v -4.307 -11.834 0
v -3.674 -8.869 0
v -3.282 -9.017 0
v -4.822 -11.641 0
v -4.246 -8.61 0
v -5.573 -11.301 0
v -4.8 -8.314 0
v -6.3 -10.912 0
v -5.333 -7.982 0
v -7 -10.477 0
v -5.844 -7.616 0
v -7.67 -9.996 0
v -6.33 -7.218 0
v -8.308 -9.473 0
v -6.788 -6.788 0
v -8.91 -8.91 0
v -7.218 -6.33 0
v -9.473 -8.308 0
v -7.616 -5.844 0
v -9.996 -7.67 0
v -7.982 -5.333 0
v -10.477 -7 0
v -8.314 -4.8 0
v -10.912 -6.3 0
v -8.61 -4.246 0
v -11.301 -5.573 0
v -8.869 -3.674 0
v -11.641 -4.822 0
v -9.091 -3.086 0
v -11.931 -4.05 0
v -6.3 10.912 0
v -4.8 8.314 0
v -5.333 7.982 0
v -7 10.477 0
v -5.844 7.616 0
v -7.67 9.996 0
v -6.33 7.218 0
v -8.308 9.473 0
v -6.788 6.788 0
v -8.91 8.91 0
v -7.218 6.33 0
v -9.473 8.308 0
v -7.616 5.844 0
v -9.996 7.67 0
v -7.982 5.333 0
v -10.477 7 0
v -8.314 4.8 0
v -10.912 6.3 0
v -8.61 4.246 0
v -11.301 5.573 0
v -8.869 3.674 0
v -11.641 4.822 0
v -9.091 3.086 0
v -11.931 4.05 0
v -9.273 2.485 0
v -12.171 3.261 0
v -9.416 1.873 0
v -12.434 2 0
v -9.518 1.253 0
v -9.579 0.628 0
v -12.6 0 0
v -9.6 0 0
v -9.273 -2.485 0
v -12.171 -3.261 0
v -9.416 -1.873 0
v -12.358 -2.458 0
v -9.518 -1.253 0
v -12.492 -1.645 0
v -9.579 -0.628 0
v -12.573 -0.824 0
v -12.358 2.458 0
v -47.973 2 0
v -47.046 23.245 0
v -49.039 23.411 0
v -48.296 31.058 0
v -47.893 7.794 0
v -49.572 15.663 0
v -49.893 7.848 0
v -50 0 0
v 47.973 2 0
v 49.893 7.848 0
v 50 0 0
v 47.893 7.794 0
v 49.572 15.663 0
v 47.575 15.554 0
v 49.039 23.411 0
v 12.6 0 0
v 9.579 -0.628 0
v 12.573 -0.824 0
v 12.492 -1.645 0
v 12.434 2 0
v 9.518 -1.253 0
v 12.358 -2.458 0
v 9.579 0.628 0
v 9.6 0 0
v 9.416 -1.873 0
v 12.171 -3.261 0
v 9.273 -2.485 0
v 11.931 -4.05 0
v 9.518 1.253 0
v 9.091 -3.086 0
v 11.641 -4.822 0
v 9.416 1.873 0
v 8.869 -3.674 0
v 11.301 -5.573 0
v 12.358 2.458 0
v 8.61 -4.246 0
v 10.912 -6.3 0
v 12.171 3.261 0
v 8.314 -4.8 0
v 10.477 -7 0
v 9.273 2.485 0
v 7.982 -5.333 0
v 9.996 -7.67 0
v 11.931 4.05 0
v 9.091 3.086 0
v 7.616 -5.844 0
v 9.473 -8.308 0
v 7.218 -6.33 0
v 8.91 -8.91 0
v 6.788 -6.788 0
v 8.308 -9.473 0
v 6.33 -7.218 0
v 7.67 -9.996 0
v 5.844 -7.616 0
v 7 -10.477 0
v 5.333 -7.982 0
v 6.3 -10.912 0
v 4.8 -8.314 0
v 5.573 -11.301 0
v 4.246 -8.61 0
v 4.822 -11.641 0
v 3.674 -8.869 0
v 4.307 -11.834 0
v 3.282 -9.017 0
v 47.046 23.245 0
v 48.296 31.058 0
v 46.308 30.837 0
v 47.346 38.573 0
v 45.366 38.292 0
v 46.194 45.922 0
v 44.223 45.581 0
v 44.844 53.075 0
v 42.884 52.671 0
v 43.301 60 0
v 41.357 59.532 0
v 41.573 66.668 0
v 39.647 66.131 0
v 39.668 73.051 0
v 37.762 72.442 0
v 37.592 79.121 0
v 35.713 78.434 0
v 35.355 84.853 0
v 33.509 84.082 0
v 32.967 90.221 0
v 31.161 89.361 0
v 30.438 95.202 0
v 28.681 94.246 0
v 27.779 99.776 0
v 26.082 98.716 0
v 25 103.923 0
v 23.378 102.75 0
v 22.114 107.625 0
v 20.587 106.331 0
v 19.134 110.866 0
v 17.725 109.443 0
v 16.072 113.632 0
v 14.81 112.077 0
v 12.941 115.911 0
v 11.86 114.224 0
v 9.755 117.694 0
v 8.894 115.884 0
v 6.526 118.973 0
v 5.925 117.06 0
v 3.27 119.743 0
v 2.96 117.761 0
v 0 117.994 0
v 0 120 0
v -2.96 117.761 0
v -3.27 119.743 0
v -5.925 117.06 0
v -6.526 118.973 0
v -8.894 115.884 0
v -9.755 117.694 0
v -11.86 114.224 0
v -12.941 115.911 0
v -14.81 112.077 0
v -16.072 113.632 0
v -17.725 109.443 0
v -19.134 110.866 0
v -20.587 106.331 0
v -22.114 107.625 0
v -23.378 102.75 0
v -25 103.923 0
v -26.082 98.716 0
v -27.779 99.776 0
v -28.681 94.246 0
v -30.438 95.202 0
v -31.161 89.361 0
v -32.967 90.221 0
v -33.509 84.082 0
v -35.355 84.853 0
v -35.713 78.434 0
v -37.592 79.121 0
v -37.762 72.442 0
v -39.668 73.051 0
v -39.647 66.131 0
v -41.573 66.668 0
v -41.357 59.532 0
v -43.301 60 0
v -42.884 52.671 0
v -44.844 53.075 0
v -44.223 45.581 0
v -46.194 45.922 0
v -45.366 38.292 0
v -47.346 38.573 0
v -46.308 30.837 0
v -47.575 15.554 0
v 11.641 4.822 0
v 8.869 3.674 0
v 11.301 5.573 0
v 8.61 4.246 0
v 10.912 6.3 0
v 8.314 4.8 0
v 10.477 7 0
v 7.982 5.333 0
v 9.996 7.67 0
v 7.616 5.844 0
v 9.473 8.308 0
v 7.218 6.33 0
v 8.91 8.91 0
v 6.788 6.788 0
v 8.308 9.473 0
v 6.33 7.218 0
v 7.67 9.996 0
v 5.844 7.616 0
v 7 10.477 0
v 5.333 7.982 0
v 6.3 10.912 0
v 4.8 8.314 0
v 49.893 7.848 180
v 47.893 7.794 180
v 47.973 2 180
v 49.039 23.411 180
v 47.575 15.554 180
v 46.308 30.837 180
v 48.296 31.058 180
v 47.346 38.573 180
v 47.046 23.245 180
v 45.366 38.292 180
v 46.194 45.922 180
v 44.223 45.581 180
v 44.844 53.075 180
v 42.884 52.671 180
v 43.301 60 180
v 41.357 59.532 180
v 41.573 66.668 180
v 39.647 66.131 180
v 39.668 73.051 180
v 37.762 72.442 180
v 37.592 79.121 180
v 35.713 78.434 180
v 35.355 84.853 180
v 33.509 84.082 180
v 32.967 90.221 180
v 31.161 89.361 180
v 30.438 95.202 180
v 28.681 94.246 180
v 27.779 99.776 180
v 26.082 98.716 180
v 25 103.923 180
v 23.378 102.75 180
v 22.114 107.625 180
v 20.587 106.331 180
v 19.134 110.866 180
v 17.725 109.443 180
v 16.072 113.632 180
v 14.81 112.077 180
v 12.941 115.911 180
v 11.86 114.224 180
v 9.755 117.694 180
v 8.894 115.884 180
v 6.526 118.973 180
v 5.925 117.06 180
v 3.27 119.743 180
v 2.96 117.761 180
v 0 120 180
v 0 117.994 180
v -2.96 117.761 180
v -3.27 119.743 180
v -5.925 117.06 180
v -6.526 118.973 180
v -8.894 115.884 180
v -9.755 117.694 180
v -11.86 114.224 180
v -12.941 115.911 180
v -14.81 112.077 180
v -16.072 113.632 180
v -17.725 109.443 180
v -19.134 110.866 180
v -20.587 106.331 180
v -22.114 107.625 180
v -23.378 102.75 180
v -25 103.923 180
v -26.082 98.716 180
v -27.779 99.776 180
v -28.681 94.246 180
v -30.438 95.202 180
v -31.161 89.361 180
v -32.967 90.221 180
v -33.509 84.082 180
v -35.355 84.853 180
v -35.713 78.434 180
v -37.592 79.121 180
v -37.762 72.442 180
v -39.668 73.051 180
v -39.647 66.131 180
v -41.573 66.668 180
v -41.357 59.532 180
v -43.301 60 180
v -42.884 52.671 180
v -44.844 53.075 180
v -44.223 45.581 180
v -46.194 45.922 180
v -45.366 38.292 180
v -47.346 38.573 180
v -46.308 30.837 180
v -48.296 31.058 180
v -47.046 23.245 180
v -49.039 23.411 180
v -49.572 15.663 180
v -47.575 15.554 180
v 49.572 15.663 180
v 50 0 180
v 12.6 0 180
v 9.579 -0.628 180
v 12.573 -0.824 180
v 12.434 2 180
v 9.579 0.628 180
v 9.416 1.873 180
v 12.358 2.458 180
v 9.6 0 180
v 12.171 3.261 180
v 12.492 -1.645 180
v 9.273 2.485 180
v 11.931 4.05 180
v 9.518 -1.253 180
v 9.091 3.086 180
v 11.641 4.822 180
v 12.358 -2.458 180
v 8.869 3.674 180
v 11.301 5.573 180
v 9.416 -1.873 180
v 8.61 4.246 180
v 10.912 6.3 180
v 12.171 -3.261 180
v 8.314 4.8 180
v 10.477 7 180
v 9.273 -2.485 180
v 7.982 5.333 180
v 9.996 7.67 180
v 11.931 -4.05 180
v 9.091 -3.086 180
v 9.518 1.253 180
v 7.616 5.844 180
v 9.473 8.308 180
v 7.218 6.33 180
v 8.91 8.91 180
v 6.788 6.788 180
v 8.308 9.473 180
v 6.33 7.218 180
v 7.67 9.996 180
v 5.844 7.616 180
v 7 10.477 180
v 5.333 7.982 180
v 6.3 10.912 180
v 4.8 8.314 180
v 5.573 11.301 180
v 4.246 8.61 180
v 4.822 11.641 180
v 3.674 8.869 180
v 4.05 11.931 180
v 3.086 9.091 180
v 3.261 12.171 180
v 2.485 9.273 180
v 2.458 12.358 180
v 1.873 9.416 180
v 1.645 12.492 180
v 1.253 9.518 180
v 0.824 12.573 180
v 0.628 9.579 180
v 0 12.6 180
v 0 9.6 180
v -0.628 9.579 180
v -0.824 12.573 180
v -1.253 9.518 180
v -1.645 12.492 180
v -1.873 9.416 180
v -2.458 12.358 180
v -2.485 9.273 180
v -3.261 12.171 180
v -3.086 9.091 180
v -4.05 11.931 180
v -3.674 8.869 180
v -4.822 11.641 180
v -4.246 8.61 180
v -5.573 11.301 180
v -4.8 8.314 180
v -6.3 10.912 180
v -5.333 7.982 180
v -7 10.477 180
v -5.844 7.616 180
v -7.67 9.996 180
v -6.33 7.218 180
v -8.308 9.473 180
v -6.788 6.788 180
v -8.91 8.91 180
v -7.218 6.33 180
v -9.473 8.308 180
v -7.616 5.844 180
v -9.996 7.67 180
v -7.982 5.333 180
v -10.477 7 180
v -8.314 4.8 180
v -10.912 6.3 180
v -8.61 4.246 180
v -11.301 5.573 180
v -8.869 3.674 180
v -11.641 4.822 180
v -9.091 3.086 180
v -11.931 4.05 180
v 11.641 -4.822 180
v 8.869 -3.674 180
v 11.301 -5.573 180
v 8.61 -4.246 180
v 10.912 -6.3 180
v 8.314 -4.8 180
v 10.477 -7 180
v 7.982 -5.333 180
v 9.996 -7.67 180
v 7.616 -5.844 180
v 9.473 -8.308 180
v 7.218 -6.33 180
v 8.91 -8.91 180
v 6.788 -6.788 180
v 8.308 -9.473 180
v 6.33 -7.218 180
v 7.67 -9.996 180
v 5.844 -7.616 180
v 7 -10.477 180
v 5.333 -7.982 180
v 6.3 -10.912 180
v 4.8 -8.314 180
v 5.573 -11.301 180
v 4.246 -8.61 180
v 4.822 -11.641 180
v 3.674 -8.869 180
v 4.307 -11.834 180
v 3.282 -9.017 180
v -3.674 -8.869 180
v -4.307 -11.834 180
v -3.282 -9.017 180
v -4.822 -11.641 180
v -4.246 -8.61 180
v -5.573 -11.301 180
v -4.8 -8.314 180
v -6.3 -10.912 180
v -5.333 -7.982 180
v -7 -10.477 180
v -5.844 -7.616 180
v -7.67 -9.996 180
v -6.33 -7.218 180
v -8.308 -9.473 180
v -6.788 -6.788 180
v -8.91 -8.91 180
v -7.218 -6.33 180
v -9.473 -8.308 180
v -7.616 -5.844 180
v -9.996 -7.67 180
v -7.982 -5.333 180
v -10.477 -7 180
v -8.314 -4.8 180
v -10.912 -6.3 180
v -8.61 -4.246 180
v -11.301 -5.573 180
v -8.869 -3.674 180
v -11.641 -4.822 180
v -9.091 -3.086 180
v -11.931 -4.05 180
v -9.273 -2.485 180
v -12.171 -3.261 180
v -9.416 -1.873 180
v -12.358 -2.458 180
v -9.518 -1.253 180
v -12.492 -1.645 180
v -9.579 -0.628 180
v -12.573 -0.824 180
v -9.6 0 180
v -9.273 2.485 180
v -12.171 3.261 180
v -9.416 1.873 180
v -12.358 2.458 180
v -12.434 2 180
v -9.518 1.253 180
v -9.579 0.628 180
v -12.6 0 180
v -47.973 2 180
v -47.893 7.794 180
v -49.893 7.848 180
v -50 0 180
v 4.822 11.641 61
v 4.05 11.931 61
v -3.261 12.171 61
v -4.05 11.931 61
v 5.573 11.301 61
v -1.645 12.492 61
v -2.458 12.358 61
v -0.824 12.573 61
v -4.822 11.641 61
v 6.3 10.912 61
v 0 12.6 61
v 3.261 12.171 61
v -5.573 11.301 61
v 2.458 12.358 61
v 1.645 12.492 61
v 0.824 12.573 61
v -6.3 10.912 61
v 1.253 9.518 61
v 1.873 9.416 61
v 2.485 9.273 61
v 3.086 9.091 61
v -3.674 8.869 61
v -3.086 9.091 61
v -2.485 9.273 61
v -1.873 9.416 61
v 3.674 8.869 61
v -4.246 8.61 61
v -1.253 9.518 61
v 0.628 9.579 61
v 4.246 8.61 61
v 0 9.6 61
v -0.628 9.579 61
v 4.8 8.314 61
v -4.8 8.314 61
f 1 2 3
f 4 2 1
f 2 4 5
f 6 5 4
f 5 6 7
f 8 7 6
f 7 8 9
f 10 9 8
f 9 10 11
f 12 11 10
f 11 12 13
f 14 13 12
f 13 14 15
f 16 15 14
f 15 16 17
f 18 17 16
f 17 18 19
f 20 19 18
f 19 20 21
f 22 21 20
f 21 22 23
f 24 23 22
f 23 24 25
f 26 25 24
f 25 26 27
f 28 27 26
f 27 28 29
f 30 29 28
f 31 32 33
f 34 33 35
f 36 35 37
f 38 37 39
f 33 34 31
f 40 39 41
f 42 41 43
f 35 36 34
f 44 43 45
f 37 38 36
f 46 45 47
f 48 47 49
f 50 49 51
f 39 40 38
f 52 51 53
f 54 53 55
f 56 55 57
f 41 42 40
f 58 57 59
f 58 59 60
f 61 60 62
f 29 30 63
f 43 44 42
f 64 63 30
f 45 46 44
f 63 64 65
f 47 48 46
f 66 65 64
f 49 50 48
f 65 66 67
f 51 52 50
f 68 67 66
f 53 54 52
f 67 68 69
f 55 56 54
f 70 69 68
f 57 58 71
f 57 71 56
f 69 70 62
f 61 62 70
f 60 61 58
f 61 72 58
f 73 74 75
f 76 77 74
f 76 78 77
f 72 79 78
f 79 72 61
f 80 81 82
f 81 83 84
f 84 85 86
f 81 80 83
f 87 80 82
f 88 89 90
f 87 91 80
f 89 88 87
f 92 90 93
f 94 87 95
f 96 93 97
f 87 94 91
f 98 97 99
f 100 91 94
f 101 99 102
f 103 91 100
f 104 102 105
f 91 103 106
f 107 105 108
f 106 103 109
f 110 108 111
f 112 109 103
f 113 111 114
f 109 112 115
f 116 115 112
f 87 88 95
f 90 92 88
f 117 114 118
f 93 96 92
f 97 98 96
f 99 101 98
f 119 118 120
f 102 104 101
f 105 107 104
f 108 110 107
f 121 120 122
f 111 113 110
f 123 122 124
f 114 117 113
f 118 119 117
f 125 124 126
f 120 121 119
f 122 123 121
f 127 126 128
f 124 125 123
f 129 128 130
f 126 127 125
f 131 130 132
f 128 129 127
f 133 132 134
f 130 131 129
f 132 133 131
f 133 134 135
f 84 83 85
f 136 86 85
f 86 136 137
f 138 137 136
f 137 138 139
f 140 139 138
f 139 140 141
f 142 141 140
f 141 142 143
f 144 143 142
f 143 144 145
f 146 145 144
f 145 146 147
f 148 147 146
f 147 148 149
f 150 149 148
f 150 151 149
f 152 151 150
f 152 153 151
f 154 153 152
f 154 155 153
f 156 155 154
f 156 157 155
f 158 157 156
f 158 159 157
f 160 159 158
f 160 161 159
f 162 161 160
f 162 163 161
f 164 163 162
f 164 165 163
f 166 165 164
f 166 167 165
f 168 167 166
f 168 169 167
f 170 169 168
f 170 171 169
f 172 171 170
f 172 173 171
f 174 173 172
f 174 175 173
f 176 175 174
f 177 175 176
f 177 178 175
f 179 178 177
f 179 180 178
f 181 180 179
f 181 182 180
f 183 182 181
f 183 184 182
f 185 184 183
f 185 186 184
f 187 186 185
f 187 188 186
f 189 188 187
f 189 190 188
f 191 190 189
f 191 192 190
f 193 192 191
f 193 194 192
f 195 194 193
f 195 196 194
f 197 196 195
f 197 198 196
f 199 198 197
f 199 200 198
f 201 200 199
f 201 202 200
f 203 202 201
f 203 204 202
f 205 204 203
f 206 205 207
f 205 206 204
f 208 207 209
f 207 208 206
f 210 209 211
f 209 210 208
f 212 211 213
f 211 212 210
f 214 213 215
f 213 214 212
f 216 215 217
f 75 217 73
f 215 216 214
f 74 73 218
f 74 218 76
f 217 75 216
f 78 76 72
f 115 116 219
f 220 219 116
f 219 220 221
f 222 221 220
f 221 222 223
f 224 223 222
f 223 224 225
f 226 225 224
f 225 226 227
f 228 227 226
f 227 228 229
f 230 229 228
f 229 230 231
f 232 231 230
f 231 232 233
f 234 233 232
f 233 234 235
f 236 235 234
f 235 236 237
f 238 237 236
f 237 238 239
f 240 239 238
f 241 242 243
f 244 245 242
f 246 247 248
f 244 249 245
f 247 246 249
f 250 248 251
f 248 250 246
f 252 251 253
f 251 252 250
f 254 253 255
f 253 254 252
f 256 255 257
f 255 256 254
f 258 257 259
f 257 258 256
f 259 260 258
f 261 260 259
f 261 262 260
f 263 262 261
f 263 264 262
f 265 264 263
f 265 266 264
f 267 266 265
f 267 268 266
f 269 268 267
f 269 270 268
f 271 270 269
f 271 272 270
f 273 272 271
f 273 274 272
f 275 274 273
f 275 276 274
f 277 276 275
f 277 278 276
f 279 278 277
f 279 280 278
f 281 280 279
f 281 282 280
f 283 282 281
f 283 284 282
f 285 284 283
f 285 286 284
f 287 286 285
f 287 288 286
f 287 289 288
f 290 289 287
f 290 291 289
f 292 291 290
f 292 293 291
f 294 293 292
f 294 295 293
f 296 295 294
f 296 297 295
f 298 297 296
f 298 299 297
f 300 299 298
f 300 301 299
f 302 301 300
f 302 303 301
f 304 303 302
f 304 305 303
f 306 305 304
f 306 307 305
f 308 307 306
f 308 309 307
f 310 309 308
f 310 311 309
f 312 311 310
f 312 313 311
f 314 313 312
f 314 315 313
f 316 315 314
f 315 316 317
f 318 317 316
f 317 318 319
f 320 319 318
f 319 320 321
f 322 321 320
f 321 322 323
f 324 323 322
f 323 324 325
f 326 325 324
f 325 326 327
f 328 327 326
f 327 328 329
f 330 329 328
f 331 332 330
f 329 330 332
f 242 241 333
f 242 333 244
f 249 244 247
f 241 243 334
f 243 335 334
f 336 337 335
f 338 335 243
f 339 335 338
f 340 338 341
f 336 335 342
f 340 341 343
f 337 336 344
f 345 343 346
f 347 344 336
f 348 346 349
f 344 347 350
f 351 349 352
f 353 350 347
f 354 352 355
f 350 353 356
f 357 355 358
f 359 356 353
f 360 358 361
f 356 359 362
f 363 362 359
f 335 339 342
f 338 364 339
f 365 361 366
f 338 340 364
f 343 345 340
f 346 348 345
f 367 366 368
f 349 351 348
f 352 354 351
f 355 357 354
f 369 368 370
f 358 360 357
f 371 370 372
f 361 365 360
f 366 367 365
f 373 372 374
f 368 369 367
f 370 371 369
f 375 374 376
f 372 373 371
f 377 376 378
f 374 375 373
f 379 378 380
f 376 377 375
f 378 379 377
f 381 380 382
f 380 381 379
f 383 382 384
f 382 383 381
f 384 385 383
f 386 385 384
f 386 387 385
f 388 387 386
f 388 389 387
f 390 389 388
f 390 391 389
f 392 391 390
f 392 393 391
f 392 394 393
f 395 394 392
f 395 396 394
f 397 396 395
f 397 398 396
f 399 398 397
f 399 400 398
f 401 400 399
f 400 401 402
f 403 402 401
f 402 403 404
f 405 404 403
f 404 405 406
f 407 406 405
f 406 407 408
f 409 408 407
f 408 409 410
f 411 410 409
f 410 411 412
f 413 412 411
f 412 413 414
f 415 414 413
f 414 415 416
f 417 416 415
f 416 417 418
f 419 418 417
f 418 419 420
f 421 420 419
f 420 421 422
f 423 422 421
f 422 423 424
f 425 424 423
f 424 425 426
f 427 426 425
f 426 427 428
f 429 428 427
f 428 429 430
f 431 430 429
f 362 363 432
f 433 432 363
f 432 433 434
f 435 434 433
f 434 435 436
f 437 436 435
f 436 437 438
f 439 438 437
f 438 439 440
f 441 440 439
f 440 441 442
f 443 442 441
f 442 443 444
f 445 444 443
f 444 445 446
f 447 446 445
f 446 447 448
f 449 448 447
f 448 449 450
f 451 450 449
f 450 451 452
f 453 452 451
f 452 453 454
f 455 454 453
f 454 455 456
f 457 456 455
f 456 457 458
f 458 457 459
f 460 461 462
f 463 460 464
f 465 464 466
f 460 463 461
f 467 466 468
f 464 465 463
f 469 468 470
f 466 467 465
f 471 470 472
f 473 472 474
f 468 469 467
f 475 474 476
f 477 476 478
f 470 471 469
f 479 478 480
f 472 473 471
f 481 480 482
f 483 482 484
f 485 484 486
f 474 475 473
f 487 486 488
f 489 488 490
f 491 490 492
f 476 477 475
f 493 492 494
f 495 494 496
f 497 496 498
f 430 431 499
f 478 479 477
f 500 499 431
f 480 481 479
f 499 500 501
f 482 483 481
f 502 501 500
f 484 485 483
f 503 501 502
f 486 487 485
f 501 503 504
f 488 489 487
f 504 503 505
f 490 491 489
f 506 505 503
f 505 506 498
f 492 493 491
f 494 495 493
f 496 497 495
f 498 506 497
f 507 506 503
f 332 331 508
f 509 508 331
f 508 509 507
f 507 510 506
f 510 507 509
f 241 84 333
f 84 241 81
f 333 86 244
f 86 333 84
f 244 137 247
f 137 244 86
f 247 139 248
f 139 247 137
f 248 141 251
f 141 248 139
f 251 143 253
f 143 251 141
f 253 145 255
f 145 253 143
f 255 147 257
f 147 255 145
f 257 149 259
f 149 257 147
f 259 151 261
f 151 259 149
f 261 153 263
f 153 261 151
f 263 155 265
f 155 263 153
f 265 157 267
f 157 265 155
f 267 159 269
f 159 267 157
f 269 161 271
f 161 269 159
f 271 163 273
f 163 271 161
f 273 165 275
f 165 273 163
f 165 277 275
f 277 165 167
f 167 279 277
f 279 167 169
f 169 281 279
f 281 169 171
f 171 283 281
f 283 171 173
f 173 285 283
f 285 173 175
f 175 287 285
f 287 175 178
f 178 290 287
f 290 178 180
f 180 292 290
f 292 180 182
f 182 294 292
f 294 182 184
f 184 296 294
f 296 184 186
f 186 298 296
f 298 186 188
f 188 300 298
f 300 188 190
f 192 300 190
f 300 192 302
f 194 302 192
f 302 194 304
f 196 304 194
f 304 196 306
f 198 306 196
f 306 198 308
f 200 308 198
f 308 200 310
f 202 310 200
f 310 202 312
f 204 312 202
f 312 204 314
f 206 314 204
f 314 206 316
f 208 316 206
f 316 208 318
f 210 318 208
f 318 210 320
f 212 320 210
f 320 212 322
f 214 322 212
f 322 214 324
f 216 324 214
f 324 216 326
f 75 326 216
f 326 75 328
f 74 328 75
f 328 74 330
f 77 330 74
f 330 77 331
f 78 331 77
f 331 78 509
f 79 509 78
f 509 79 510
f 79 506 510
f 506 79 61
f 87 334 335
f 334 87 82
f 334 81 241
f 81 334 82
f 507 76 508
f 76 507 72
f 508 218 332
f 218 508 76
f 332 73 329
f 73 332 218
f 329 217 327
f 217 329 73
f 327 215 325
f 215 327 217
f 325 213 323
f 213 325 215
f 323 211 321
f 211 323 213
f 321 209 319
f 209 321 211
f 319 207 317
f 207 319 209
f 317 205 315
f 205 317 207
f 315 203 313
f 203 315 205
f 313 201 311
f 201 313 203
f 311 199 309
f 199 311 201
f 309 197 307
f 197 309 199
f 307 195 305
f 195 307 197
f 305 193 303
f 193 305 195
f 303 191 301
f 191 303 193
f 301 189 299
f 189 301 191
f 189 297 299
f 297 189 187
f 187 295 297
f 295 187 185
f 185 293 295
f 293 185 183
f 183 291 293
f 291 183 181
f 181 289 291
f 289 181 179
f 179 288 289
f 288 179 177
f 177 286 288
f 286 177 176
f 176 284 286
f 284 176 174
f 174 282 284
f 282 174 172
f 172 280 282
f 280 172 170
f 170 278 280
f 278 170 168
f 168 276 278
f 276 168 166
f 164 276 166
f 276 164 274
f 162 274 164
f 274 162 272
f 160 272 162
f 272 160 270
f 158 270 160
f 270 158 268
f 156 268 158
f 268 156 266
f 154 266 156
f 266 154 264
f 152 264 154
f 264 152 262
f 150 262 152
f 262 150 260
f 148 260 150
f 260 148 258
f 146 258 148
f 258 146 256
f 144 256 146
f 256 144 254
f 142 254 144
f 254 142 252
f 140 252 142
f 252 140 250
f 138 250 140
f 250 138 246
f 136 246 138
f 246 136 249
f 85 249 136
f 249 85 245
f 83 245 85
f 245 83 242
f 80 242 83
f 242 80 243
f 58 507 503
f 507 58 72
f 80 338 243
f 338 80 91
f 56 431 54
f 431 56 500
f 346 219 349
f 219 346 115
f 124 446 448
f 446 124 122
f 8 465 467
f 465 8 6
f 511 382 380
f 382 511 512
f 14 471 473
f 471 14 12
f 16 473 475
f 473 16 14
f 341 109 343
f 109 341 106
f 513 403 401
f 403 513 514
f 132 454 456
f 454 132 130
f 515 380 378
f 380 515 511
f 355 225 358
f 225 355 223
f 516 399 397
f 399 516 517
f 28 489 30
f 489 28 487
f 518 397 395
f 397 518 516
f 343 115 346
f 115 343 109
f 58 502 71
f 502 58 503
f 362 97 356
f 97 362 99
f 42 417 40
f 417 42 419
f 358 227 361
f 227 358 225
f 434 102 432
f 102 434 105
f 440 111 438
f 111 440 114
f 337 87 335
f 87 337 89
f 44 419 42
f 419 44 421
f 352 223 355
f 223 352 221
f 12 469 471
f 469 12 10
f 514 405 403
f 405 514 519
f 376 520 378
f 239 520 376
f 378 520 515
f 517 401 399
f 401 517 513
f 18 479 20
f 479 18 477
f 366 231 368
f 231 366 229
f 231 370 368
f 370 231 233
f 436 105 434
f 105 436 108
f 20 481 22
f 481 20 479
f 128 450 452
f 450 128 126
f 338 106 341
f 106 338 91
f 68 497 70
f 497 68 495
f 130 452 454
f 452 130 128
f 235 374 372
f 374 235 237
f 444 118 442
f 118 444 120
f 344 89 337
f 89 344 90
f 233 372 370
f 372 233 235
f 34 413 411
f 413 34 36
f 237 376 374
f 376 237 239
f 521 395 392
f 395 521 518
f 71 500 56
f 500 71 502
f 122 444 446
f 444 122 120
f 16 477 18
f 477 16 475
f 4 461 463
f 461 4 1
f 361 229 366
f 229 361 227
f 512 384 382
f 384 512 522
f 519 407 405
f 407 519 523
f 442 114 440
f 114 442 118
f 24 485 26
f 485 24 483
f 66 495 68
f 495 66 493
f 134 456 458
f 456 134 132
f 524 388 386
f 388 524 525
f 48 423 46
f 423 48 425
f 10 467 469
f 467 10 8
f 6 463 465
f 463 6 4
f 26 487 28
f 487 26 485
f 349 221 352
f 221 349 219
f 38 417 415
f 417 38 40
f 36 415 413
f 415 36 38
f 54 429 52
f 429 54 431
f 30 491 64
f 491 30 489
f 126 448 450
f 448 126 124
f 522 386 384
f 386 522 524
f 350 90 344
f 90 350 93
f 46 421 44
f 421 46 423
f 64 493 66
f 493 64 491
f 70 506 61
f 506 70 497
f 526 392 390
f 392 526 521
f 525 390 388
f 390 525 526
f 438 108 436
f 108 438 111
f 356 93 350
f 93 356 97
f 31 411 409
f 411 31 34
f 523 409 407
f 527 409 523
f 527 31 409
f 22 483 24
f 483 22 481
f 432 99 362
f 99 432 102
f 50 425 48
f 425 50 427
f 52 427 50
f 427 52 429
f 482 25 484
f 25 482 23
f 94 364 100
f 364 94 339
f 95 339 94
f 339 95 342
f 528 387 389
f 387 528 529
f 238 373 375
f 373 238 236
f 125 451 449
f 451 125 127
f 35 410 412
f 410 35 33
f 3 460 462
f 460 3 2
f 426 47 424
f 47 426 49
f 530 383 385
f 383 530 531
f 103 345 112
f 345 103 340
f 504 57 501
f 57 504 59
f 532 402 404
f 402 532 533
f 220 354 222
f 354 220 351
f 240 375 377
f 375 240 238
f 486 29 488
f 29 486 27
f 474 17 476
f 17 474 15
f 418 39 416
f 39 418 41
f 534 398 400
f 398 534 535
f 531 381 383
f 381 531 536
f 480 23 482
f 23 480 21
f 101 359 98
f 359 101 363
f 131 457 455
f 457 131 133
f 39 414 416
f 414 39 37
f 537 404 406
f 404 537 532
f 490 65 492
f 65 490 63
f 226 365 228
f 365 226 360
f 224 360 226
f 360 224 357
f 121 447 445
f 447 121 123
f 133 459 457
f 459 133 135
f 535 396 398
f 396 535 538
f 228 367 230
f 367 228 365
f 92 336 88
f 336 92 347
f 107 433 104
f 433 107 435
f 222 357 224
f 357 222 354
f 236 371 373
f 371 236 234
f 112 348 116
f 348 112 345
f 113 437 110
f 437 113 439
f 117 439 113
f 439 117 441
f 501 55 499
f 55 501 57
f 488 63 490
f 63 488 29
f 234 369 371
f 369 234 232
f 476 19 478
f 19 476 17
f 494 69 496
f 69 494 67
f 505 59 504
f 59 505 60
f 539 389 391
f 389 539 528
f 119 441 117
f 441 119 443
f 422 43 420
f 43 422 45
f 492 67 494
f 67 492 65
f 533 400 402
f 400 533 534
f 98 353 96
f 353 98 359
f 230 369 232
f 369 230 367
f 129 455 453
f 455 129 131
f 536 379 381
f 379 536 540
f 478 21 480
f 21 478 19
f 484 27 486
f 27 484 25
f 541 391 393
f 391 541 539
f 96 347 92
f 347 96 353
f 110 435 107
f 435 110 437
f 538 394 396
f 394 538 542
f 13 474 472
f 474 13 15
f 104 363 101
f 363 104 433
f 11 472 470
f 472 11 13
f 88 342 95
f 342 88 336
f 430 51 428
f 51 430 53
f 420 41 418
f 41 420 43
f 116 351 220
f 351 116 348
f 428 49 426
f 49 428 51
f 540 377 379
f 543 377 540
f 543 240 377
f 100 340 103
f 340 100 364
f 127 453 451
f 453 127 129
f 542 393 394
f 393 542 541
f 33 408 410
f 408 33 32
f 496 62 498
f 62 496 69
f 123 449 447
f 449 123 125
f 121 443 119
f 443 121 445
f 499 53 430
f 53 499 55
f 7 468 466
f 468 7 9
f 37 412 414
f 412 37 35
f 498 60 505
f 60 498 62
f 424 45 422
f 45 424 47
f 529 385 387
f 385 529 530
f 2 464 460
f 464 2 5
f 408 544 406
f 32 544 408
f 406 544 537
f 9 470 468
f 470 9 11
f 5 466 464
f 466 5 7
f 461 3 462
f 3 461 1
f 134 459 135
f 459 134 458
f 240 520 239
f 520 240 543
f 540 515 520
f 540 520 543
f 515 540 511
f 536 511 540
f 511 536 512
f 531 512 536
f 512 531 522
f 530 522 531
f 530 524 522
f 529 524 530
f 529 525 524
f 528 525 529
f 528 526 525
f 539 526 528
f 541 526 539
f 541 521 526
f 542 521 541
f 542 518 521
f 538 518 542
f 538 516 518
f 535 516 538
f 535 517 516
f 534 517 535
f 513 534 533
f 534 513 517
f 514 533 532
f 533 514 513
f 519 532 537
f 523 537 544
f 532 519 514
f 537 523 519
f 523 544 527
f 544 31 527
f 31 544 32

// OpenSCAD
// Lampenschirm für Stehlampe – D-förmiger Querschnitt mit Klemmkragen
// Alle Maße in Millimetern (Regel: units-mm)
//
// Kontext: context/printer.md, context/tolerances.md und context/materials.md
// waren zum Zeitpunkt der Modellierung leer (siehe Regel: context-first).
// Folgende Annahmen wurden im Design-Dialog mit dem Nutzer geklärt:
//   - Baubett >= 200mm Z-Höhe vorhanden -> Schirm wird als ein Teil,
//     stehend, in voller Höhe gedruckt.
//   - Klemmkragen als offener Federclip (C-Ring): Innendurchmesser 0.8mm
//     unter Stangendurchmesser (19.2mm ID auf 20mm Stange) für Vorspannung.
//   - E14-Fassung wird separat an der Stange montiert; der Schirm ist reine
//     Abdeckung/Diffusor ohne Kabeldurchführung.
//   - Klemmkragen-Wandstärke bewusst dicker als die 2mm-Schirmwand gewählt
//     (Klemmkraft/Stabilität), da context/tolerances.md keine Vorgabe macht.
//     -> Vor dem Druck gegenrechnen/prüfen (qa-agent / geometry-check).
//
// Änderungen gegenüber 001 (Nutzer-Feedback):
//   - Bohrung für die Stange schneidet jetzt durch die GESAMTE Baugruppe
//     (Schirmwand + Klemmkragen), nicht nur durch den Klemmkragen selbst.
//     Vorher blieb die Rückwand des Schirms mittig in der Klemme stehen,
//     wodurch die Stange nicht eingeklemmt werden konnte.
//   - Zusätzlicher zweiter Schlitz im unteren Drittel der Klemme auf der
//     Innenseite (Richtung Schirm-Innenraum, +Y), damit die Klemme seitlich
//     über die an der Stange montierte E14-Fassung geschoben werden kann.
//     Breite des Schlitzes (socket_slot_deg) ist eine Annahme, da die
//     tatsächlichen Maße der Fassung/Halterung nicht bekannt sind -> vor
//     dem Druck gegen die reale Fassung prüfen.

// ---- Parameter ----
shade_height = 180;   // Gesamthöhe des Schirms
shade_width  = 100;   // Breite entlang der flachen Rückseite (X)
shade_depth  = 120;   // Tiefe von Rückseite bis vorderster Wölbung (Y)
wall_t       = 2;     // Wandstärke Schirm (dünn für Lichtdurchlässigkeit)

rod_d      = 20;                 // Durchmesser der Metallstange
rod_r      = rod_d / 2;
clip_id    = 19.2;               // Innendurchmesser Klemmkragen (Vorspannung, ~0.8mm Untermaß)
clip_r_in  = clip_id / 2;
clip_wall  = 3;                  // Wandstärke Klemmkragen (dicker als Schirmwand, siehe oben)
clip_r_out = clip_r_in + clip_wall;
clip_gap_deg = 40;                    // Öffnungswinkel des C-Rings (Montagespalt, zeigt nach -Y)

socket_slot_deg    = 60;              // Öffnungswinkel des Fassungs-Schlitzes (Innenseite, +Y) - Annahme
socket_slot_height = shade_height / 3; // unteres Drittel der Klemme ist auf der Innenseite offen

$fn = 96;

// D-förmiges 2D-Profil: flache Rückseite bei y=0 (Breite = shade_width),
// halbovale (elliptische) Vorderseite bis y=shade_depth
module shade_outline() {
    intersection() {
        scale([shade_width / 2, shade_depth, 1])
            circle(r = 1);
        translate([-shade_width, 0, 0])
            square([shade_width * 2, shade_depth + 1]);
    }
}

// Dünnwandige Hülle des Schirms, oben und unten offen (kein Deckel/Boden)
module shade_shell() {
    linear_extrude(height = shade_height)
        difference() {
            shade_outline();
            offset(delta = -wall_t)
                shade_outline();
        }
}

// Keilförmiger 2D-Ausschnitt, zentriert auf Winkel 0
module pie_wedge_2d(radius, angle_deg) {
    a = angle_deg / 2;
    polygon(points = [
        [0, 0],
        [radius * cos(a), radius * sin(a)],
        [radius * cos(-a), radius * sin(-a)]
    ]);
}

// Radialer Schlitz von z0 bis z1, in Richtung facing_deg ausgerichtet
module radial_slot(radius, angle_deg, facing_deg, z0, z1) {
    translate([0, 0, z0])
        rotate([0, 0, facing_deg])
            linear_extrude(z1 - z0)
                pie_wedge_2d(radius, angle_deg);
}

// Alle Ausschnitte für die Klemme: durchgehende Stangenbohrung + Montagespalt
// (volle Höhe, -Y) + Fassungs-Schlitz (unteres Drittel, +Y). Wird von der
// GESAMTEN Baugruppe (Schirmwand + Klemmkragen-Rohling) subtrahiert, damit
// auch die Schirm-Rückwand im Bohrungsbereich mit entfernt wird.
module clamp_cutouts() {
    union() {
        translate([0, 0, -1])
            cylinder(r = clip_r_in, h = shade_height + 2);

        radial_slot(clip_r_out + 5, clip_gap_deg, 270, -1, shade_height + 1);

        radial_slot(clip_r_out + 5, socket_slot_deg, 90, -1, socket_slot_height + 1);
    }
}

// render() erzwingt hier die vollständige (exakte) Boolesche Berechnung statt
// der schnellen OpenCSG-Live-Vorschau. Ohne render() kann die verschachtelte
// difference()/union()-Struktur in der OpenSCAD-Vorschau (F5) fehlerhaft
// aussehen (Z-Fighting/scheinbar "kaputte" geschlossene Klemme), obwohl die
// tatsächlich berechnete Geometrie (F6 bzw. STL-Export) bereits korrekt ist.
render(convexity = 10)
    difference() {
        union() {
            shade_shell();
            cylinder(r = clip_r_out, h = shade_height); // Klemmkragen-Rohling, zentriert auf der Rückseite (x=0, y=0)
        }
        clamp_cutouts();
    }
